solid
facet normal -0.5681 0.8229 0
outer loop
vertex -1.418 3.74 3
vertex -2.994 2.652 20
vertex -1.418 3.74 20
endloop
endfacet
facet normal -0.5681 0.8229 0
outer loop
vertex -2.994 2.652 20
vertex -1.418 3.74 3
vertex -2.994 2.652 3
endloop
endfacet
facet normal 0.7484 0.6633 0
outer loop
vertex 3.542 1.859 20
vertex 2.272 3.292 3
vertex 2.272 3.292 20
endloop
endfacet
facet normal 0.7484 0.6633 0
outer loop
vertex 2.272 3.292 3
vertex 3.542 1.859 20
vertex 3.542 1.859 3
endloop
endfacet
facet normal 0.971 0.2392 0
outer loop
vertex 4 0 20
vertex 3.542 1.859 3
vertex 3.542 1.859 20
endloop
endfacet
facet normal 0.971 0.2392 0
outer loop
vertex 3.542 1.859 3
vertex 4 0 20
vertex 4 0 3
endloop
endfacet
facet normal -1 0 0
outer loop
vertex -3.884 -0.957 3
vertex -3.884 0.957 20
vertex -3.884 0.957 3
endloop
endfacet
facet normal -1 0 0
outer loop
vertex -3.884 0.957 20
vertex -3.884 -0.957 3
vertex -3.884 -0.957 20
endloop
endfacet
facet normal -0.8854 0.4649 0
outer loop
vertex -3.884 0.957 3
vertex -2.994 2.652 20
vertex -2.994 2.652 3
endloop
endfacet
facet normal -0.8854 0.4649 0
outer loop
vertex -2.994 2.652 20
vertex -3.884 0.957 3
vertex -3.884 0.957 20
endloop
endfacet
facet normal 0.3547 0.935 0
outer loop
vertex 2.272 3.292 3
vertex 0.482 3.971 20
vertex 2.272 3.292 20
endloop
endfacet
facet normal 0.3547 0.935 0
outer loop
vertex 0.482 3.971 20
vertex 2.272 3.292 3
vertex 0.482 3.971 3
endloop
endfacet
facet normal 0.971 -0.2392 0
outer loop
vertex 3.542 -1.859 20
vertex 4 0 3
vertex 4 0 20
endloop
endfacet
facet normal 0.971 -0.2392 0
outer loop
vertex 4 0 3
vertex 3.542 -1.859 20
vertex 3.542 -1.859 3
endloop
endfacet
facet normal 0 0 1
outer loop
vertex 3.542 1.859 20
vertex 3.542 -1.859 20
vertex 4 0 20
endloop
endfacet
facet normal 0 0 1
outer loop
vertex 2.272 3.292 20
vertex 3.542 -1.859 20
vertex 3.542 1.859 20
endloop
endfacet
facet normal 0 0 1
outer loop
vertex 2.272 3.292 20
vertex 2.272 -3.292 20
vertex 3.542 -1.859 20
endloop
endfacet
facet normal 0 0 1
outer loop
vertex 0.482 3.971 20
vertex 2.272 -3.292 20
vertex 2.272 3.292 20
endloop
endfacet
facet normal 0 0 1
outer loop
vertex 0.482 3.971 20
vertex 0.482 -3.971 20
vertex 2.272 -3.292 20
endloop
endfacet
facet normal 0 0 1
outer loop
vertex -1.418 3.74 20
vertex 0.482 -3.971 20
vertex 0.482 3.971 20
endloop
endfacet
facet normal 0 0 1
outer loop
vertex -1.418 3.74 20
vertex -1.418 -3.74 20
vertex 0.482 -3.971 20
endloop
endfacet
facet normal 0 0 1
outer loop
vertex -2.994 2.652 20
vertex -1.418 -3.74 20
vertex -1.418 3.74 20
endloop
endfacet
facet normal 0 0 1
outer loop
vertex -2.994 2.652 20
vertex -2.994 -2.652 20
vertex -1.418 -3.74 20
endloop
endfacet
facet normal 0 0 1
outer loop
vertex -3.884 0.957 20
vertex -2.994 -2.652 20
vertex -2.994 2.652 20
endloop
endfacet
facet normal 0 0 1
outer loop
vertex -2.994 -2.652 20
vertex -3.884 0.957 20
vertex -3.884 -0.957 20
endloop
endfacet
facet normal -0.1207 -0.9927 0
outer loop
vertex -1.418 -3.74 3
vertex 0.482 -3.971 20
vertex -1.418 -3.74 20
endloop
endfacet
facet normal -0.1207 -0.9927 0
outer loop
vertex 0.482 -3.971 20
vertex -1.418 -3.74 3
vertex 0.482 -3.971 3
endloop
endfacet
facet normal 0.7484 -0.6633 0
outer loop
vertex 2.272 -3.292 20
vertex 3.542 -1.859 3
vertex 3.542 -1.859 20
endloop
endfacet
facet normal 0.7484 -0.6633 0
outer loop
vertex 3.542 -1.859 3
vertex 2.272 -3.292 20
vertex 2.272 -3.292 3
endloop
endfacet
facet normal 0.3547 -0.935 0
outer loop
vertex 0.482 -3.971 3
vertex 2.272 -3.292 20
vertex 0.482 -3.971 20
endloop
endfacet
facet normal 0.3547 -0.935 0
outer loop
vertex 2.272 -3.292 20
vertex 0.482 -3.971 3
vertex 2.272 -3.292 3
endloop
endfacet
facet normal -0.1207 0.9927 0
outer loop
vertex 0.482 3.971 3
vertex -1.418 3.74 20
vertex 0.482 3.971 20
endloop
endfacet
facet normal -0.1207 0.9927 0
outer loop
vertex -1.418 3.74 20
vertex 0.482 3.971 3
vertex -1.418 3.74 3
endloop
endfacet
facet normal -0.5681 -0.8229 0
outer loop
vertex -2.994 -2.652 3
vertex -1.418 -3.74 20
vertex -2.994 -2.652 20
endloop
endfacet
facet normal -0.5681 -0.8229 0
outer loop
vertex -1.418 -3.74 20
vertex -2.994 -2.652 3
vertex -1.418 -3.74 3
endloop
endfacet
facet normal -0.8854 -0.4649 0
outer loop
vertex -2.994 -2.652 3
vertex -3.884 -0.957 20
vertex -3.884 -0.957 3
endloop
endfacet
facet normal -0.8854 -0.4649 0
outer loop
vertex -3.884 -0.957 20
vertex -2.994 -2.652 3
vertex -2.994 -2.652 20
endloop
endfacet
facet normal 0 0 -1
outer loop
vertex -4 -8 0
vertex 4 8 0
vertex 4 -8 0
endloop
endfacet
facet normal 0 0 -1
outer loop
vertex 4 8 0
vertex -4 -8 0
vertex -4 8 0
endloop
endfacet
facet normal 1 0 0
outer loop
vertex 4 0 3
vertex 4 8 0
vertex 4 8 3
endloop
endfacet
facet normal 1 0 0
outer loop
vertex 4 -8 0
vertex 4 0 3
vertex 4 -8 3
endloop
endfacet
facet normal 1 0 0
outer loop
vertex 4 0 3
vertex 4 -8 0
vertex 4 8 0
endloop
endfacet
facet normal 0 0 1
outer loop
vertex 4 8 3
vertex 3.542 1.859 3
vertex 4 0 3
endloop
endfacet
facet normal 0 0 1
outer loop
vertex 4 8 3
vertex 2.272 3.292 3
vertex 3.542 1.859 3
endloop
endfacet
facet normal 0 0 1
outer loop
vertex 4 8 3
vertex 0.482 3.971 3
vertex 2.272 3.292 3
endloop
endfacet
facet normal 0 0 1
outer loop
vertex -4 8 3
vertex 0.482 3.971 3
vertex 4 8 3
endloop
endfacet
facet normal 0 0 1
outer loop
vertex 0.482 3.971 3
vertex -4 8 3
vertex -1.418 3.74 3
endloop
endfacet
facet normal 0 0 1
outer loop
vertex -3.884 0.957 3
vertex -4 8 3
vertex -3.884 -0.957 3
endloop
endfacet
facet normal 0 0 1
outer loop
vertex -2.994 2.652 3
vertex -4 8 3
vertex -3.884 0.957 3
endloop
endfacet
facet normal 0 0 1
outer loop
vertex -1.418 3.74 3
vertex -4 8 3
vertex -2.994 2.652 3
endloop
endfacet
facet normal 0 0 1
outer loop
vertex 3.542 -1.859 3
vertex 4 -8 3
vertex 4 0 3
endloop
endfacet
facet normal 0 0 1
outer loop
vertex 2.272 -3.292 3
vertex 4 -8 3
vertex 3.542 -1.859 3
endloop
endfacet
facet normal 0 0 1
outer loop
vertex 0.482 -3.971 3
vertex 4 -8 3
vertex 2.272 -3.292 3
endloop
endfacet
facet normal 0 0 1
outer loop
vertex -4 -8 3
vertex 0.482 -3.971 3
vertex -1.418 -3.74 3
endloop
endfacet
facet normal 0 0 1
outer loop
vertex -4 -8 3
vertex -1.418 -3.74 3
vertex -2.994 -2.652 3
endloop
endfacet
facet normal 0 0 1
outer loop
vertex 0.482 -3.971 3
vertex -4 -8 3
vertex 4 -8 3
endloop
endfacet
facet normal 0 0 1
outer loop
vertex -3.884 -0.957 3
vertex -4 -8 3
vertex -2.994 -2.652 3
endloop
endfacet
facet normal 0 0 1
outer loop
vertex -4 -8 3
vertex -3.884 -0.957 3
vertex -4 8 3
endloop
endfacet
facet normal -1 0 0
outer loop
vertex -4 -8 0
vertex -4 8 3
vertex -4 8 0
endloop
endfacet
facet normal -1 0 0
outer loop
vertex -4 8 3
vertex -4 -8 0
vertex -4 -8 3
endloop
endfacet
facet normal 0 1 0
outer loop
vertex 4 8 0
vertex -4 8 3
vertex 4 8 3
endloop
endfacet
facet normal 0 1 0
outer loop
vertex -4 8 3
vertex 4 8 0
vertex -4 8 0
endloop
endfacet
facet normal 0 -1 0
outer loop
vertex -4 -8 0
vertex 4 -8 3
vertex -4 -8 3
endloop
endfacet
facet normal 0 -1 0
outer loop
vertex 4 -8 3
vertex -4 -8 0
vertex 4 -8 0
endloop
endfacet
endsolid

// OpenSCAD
union() {
	cylinder(h = 20, r = 4);
	translate(v = [-4, -8, 0]) {
		cube(size = [8, 16, 3]);
	}
}
